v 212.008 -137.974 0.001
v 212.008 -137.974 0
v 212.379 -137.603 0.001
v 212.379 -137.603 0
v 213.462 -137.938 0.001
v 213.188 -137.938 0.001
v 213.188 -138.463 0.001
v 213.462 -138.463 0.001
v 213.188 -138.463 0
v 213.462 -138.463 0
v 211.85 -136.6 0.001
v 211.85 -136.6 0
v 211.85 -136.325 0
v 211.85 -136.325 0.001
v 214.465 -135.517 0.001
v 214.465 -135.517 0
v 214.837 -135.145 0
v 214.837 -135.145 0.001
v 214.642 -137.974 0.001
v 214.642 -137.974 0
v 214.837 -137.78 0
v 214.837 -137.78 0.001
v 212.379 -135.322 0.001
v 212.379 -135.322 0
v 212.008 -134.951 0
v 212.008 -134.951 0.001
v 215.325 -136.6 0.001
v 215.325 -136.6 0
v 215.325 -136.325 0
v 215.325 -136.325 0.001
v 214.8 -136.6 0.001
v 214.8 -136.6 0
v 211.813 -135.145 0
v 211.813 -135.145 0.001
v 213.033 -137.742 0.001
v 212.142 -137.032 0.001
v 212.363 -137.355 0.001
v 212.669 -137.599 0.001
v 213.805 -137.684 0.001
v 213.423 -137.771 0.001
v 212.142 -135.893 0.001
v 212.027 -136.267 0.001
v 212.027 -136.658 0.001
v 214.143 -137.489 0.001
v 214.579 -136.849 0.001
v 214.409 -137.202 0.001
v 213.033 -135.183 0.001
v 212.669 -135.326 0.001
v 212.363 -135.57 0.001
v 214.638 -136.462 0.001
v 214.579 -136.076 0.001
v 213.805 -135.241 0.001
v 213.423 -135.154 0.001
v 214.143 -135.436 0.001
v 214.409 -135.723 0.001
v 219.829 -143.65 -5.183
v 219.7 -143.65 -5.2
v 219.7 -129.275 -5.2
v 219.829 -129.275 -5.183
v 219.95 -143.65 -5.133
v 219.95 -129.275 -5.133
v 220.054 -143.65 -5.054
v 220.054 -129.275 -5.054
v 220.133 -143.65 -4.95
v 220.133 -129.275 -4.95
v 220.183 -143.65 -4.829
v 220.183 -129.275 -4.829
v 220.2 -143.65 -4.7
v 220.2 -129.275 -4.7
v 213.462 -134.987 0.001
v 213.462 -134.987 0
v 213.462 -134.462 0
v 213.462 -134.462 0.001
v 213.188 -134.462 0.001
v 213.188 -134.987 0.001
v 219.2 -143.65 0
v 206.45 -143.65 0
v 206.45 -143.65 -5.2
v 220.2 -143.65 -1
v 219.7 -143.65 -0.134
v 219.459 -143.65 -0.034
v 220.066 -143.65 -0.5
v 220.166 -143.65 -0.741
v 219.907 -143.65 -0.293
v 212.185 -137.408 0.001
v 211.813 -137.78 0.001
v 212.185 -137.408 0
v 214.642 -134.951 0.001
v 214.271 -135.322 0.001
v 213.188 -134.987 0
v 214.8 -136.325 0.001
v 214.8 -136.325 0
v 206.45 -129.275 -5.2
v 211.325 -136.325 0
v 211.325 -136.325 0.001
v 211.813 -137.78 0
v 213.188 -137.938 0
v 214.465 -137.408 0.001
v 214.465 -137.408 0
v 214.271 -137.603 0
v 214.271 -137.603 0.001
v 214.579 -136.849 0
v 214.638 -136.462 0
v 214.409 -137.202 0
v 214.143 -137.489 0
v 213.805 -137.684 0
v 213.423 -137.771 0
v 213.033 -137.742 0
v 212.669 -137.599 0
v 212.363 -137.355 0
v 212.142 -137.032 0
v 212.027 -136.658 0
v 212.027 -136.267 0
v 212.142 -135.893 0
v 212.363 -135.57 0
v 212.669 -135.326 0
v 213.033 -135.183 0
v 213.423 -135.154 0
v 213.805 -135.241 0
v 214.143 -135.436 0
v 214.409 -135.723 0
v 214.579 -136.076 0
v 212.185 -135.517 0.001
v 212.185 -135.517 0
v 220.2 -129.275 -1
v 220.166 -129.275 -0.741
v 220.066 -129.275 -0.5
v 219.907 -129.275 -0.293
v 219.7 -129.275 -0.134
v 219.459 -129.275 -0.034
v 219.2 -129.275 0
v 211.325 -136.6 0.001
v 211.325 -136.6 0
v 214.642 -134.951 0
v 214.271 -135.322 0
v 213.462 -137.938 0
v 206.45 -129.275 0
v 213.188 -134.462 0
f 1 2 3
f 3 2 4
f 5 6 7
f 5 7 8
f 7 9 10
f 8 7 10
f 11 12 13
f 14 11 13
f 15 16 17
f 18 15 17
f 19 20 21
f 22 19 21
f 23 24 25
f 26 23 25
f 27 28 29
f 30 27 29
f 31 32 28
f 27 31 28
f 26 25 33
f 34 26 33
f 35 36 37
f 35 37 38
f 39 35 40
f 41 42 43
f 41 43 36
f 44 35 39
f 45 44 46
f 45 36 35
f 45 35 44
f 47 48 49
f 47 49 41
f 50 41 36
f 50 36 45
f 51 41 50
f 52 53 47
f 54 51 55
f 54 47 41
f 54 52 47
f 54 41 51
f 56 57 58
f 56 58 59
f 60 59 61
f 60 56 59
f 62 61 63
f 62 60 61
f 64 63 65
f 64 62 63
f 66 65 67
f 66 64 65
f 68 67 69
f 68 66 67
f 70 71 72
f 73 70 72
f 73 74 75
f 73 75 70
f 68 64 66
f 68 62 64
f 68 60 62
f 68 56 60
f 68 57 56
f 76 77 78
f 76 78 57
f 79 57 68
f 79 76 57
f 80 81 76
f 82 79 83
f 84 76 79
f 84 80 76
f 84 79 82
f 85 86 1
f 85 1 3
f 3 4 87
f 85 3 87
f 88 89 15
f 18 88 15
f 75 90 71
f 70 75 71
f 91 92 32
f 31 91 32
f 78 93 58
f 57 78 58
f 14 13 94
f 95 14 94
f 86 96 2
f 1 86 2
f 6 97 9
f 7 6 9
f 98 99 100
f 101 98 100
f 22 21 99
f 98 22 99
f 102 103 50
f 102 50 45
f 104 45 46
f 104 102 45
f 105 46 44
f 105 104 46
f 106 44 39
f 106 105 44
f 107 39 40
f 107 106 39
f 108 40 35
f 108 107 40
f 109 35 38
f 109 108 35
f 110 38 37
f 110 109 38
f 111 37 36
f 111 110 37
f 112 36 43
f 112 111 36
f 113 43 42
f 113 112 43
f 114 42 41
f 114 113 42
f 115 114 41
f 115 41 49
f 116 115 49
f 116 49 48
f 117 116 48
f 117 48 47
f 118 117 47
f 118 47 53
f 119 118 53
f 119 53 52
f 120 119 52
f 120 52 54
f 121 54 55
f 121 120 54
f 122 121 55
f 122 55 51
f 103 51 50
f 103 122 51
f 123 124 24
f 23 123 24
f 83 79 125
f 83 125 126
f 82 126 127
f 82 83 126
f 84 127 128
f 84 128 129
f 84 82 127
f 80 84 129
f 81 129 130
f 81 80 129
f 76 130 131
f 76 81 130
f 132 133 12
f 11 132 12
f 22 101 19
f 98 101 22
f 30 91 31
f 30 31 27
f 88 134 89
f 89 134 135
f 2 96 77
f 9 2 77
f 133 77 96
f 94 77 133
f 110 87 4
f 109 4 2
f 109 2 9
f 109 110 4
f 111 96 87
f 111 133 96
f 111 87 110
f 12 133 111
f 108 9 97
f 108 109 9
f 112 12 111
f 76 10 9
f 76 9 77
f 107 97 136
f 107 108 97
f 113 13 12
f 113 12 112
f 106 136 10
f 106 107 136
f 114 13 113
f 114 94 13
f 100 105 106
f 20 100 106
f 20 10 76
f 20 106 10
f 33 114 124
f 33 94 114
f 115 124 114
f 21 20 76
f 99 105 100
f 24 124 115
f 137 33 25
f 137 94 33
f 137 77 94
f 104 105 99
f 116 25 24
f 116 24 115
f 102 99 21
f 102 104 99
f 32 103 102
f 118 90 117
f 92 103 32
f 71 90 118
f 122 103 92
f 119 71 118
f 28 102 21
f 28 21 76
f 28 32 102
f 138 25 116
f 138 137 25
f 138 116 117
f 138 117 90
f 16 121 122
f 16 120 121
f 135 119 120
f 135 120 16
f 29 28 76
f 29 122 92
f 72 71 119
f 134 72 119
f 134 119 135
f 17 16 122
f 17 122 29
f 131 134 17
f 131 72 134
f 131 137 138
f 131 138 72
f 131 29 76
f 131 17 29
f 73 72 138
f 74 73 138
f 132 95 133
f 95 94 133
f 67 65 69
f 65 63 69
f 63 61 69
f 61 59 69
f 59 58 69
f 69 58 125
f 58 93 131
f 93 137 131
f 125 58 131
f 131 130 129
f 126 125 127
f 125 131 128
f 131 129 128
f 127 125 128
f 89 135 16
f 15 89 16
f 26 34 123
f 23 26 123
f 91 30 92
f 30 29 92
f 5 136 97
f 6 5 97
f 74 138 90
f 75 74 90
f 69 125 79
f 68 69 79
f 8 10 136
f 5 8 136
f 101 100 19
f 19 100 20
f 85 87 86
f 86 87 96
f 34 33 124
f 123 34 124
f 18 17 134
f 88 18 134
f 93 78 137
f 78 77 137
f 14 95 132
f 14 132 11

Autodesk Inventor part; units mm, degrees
ref_plane "YZ Plane" through (0, 0, 0) normal (1, 0, 0) x (0, 1, 0)
ref_plane "XZ Plane" through (0, 0, 0) normal (0, 1, 0) x (-1, 0, 0)
ref_plane "XY Plane" through (0, 0, 0) normal (0, 0, 1) x (1, 0, 0)
sketch "Szkic1" plane through (0, 0, 0) normal (0, 0, 1) x (1, 0, 0)
  line L0 (206.45, -143.65) -> (206.45, -129.275)
  line L1 (206.45, -129.275) -> (220.2, -129.275)
  line L2 (206.45, -143.65) -> (220.2, -143.65)
  line L3 (220.2, -129.275) -> (220.2, -143.65)
extrude "Wyciągnięcie proste1" add sketch "Szkic1" against normal blind 5.2
fillet "Zaokrąglenie1" radius 0.5 1 edges at (220.2, -136.4625, -5.2)
sketch "Szkic6" plane through (0, 0, 0) normal (0, 0, 1) x (1, 0, 0)
  arc A0 (213.325, -135.3377) -> (213.325, -137.5873) centre (213.325, -136.4625) ccw
  circle A1 centre (213.325, -136.4625) radius 1.3125
  line L0 (213.4625, -134.4622) -> (213.1875, -134.4622)
  line L1 (213.1875, -134.4622) -> (213.1875, -134.9872)
  line L2 (213.1875, -134.9872) -> (213.4625, -134.9872)
  line L3 (213.4625, -134.9872) -> (213.4625, -134.4622)
  line L4 (210.4962, -136.4625) -> (213.325, -133.6337) construction
  line L5 (212.0078, -134.9509) -> (211.8134, -135.1453)
  line L6 (211.8134, -135.1453) -> (212.1846, -135.5166)
  line L7 (212.1846, -135.5166) -> (212.3791, -135.3221)
  line L8 (212.3791, -135.3221) -> (212.0078, -134.9509)
  line L9 (211.3247, -138.4628) -> (211.3247, -134.4622) construction
  line L10 (211.3247, -136.325) -> (211.3247, -136.6)
  line L11 (211.3247, -136.6) -> (211.8497, -136.6)
  line L12 (211.8497, -136.6) -> (211.8497, -136.325)
  line L13 (211.8497, -136.325) -> (211.3247, -136.325)
  line L14 (213.325, -139.2913) -> (210.4962, -136.4625) construction
  line L15 (211.8134, -137.7797) -> (212.0078, -137.9741)
  line L16 (212.0078, -137.9741) -> (212.3791, -137.6029)
  line L17 (212.3791, -137.6029) -> (212.1846, -137.4084)
  line L18 (212.1846, -137.4084) -> (211.8134, -137.7797)
  line L19 (215.3253, -138.4628) -> (211.3247, -138.4628) construction
  line L20 (213.1875, -138.4628) -> (213.4625, -138.4628)
  line L21 (213.4625, -138.4628) -> (213.4625, -137.9378)
  line L22 (213.4625, -137.9378) -> (213.1875, -137.9378)
  line L23 (213.1875, -137.9378) -> (213.1875, -138.4628)
  line L24 (216.1538, -136.4625) -> (213.325, -139.2913) construction
  line L25 (214.6422, -137.9741) -> (214.8366, -137.7797)
  line L26 (214.8366, -137.7797) -> (214.4654, -137.4084)
  line L27 (214.4654, -137.4084) -> (214.2709, -137.6029)
  line L28 (214.2709, -137.6029) -> (214.6422, -137.9741)
  line L29 (215.3253, -134.4622) -> (215.3253, -138.4628) construction
  line L30 (215.3253, -136.6) -> (215.3253, -136.325)
  line L31 (215.3253, -136.325) -> (214.8003, -136.325)
  line L32 (214.8003, -136.325) -> (214.8003, -136.6)
  line L33 (214.8003, -136.6) -> (215.3253, -136.6)
  line L34 (213.325, -133.6337) -> (216.1538, -136.4625) construction
  line L35 (214.8366, -135.1453) -> (214.6422, -134.9509)
  line L36 (214.6422, -134.9509) -> (214.2709, -135.3221)
  line L37 (214.2709, -135.3221) -> (214.4654, -135.5166)
  line L38 (214.4654, -135.5166) -> (214.8366, -135.1453)
  line L39 (213.325, -136.4625) -> (213.325, -135.3377)
  line L40 (213.325, -136.4625) -> (213.325, -137.5873)
  point P0 (211.3247, -134.4622)
  point P1 (213.325, -134.7247)
  point P2 (212.0962, -135.2337)
  point P3 (211.5872, -136.4625)
  point P4 (212.0962, -137.6913)
  point P5 (213.325, -138.2003)
  point P6 (214.5538, -137.6913)
  point P7 (215.0628, -136.4625)
  point P8 (214.5538, -135.2337)
  dimension "d55" = 2.625
  dimension "d57" = 0.275
  dimension "d61" = 360
fillet "Zaokrąglenie2" radius 1 1 edges at (220.2, -136.4625, 0)
extrude "Wyciągnięcie proste5" add sketch "Szkic6" along normal blind 0.001 contours L39 L40 A0 | A1 | L3 L2 L1 L0 | L8 L7 L6 L5 | L13 L12 L11 L10 | L18 L17 L16 L15 | L23 L22 L21 L20 | L28 L27 L26 L25 | L33 L32 L31 L30 | L38 L37 L36 L35
properties part number "PRZYCISK IO" material "Tworzywo sztuczne, nieprzezroczyste czarne"
